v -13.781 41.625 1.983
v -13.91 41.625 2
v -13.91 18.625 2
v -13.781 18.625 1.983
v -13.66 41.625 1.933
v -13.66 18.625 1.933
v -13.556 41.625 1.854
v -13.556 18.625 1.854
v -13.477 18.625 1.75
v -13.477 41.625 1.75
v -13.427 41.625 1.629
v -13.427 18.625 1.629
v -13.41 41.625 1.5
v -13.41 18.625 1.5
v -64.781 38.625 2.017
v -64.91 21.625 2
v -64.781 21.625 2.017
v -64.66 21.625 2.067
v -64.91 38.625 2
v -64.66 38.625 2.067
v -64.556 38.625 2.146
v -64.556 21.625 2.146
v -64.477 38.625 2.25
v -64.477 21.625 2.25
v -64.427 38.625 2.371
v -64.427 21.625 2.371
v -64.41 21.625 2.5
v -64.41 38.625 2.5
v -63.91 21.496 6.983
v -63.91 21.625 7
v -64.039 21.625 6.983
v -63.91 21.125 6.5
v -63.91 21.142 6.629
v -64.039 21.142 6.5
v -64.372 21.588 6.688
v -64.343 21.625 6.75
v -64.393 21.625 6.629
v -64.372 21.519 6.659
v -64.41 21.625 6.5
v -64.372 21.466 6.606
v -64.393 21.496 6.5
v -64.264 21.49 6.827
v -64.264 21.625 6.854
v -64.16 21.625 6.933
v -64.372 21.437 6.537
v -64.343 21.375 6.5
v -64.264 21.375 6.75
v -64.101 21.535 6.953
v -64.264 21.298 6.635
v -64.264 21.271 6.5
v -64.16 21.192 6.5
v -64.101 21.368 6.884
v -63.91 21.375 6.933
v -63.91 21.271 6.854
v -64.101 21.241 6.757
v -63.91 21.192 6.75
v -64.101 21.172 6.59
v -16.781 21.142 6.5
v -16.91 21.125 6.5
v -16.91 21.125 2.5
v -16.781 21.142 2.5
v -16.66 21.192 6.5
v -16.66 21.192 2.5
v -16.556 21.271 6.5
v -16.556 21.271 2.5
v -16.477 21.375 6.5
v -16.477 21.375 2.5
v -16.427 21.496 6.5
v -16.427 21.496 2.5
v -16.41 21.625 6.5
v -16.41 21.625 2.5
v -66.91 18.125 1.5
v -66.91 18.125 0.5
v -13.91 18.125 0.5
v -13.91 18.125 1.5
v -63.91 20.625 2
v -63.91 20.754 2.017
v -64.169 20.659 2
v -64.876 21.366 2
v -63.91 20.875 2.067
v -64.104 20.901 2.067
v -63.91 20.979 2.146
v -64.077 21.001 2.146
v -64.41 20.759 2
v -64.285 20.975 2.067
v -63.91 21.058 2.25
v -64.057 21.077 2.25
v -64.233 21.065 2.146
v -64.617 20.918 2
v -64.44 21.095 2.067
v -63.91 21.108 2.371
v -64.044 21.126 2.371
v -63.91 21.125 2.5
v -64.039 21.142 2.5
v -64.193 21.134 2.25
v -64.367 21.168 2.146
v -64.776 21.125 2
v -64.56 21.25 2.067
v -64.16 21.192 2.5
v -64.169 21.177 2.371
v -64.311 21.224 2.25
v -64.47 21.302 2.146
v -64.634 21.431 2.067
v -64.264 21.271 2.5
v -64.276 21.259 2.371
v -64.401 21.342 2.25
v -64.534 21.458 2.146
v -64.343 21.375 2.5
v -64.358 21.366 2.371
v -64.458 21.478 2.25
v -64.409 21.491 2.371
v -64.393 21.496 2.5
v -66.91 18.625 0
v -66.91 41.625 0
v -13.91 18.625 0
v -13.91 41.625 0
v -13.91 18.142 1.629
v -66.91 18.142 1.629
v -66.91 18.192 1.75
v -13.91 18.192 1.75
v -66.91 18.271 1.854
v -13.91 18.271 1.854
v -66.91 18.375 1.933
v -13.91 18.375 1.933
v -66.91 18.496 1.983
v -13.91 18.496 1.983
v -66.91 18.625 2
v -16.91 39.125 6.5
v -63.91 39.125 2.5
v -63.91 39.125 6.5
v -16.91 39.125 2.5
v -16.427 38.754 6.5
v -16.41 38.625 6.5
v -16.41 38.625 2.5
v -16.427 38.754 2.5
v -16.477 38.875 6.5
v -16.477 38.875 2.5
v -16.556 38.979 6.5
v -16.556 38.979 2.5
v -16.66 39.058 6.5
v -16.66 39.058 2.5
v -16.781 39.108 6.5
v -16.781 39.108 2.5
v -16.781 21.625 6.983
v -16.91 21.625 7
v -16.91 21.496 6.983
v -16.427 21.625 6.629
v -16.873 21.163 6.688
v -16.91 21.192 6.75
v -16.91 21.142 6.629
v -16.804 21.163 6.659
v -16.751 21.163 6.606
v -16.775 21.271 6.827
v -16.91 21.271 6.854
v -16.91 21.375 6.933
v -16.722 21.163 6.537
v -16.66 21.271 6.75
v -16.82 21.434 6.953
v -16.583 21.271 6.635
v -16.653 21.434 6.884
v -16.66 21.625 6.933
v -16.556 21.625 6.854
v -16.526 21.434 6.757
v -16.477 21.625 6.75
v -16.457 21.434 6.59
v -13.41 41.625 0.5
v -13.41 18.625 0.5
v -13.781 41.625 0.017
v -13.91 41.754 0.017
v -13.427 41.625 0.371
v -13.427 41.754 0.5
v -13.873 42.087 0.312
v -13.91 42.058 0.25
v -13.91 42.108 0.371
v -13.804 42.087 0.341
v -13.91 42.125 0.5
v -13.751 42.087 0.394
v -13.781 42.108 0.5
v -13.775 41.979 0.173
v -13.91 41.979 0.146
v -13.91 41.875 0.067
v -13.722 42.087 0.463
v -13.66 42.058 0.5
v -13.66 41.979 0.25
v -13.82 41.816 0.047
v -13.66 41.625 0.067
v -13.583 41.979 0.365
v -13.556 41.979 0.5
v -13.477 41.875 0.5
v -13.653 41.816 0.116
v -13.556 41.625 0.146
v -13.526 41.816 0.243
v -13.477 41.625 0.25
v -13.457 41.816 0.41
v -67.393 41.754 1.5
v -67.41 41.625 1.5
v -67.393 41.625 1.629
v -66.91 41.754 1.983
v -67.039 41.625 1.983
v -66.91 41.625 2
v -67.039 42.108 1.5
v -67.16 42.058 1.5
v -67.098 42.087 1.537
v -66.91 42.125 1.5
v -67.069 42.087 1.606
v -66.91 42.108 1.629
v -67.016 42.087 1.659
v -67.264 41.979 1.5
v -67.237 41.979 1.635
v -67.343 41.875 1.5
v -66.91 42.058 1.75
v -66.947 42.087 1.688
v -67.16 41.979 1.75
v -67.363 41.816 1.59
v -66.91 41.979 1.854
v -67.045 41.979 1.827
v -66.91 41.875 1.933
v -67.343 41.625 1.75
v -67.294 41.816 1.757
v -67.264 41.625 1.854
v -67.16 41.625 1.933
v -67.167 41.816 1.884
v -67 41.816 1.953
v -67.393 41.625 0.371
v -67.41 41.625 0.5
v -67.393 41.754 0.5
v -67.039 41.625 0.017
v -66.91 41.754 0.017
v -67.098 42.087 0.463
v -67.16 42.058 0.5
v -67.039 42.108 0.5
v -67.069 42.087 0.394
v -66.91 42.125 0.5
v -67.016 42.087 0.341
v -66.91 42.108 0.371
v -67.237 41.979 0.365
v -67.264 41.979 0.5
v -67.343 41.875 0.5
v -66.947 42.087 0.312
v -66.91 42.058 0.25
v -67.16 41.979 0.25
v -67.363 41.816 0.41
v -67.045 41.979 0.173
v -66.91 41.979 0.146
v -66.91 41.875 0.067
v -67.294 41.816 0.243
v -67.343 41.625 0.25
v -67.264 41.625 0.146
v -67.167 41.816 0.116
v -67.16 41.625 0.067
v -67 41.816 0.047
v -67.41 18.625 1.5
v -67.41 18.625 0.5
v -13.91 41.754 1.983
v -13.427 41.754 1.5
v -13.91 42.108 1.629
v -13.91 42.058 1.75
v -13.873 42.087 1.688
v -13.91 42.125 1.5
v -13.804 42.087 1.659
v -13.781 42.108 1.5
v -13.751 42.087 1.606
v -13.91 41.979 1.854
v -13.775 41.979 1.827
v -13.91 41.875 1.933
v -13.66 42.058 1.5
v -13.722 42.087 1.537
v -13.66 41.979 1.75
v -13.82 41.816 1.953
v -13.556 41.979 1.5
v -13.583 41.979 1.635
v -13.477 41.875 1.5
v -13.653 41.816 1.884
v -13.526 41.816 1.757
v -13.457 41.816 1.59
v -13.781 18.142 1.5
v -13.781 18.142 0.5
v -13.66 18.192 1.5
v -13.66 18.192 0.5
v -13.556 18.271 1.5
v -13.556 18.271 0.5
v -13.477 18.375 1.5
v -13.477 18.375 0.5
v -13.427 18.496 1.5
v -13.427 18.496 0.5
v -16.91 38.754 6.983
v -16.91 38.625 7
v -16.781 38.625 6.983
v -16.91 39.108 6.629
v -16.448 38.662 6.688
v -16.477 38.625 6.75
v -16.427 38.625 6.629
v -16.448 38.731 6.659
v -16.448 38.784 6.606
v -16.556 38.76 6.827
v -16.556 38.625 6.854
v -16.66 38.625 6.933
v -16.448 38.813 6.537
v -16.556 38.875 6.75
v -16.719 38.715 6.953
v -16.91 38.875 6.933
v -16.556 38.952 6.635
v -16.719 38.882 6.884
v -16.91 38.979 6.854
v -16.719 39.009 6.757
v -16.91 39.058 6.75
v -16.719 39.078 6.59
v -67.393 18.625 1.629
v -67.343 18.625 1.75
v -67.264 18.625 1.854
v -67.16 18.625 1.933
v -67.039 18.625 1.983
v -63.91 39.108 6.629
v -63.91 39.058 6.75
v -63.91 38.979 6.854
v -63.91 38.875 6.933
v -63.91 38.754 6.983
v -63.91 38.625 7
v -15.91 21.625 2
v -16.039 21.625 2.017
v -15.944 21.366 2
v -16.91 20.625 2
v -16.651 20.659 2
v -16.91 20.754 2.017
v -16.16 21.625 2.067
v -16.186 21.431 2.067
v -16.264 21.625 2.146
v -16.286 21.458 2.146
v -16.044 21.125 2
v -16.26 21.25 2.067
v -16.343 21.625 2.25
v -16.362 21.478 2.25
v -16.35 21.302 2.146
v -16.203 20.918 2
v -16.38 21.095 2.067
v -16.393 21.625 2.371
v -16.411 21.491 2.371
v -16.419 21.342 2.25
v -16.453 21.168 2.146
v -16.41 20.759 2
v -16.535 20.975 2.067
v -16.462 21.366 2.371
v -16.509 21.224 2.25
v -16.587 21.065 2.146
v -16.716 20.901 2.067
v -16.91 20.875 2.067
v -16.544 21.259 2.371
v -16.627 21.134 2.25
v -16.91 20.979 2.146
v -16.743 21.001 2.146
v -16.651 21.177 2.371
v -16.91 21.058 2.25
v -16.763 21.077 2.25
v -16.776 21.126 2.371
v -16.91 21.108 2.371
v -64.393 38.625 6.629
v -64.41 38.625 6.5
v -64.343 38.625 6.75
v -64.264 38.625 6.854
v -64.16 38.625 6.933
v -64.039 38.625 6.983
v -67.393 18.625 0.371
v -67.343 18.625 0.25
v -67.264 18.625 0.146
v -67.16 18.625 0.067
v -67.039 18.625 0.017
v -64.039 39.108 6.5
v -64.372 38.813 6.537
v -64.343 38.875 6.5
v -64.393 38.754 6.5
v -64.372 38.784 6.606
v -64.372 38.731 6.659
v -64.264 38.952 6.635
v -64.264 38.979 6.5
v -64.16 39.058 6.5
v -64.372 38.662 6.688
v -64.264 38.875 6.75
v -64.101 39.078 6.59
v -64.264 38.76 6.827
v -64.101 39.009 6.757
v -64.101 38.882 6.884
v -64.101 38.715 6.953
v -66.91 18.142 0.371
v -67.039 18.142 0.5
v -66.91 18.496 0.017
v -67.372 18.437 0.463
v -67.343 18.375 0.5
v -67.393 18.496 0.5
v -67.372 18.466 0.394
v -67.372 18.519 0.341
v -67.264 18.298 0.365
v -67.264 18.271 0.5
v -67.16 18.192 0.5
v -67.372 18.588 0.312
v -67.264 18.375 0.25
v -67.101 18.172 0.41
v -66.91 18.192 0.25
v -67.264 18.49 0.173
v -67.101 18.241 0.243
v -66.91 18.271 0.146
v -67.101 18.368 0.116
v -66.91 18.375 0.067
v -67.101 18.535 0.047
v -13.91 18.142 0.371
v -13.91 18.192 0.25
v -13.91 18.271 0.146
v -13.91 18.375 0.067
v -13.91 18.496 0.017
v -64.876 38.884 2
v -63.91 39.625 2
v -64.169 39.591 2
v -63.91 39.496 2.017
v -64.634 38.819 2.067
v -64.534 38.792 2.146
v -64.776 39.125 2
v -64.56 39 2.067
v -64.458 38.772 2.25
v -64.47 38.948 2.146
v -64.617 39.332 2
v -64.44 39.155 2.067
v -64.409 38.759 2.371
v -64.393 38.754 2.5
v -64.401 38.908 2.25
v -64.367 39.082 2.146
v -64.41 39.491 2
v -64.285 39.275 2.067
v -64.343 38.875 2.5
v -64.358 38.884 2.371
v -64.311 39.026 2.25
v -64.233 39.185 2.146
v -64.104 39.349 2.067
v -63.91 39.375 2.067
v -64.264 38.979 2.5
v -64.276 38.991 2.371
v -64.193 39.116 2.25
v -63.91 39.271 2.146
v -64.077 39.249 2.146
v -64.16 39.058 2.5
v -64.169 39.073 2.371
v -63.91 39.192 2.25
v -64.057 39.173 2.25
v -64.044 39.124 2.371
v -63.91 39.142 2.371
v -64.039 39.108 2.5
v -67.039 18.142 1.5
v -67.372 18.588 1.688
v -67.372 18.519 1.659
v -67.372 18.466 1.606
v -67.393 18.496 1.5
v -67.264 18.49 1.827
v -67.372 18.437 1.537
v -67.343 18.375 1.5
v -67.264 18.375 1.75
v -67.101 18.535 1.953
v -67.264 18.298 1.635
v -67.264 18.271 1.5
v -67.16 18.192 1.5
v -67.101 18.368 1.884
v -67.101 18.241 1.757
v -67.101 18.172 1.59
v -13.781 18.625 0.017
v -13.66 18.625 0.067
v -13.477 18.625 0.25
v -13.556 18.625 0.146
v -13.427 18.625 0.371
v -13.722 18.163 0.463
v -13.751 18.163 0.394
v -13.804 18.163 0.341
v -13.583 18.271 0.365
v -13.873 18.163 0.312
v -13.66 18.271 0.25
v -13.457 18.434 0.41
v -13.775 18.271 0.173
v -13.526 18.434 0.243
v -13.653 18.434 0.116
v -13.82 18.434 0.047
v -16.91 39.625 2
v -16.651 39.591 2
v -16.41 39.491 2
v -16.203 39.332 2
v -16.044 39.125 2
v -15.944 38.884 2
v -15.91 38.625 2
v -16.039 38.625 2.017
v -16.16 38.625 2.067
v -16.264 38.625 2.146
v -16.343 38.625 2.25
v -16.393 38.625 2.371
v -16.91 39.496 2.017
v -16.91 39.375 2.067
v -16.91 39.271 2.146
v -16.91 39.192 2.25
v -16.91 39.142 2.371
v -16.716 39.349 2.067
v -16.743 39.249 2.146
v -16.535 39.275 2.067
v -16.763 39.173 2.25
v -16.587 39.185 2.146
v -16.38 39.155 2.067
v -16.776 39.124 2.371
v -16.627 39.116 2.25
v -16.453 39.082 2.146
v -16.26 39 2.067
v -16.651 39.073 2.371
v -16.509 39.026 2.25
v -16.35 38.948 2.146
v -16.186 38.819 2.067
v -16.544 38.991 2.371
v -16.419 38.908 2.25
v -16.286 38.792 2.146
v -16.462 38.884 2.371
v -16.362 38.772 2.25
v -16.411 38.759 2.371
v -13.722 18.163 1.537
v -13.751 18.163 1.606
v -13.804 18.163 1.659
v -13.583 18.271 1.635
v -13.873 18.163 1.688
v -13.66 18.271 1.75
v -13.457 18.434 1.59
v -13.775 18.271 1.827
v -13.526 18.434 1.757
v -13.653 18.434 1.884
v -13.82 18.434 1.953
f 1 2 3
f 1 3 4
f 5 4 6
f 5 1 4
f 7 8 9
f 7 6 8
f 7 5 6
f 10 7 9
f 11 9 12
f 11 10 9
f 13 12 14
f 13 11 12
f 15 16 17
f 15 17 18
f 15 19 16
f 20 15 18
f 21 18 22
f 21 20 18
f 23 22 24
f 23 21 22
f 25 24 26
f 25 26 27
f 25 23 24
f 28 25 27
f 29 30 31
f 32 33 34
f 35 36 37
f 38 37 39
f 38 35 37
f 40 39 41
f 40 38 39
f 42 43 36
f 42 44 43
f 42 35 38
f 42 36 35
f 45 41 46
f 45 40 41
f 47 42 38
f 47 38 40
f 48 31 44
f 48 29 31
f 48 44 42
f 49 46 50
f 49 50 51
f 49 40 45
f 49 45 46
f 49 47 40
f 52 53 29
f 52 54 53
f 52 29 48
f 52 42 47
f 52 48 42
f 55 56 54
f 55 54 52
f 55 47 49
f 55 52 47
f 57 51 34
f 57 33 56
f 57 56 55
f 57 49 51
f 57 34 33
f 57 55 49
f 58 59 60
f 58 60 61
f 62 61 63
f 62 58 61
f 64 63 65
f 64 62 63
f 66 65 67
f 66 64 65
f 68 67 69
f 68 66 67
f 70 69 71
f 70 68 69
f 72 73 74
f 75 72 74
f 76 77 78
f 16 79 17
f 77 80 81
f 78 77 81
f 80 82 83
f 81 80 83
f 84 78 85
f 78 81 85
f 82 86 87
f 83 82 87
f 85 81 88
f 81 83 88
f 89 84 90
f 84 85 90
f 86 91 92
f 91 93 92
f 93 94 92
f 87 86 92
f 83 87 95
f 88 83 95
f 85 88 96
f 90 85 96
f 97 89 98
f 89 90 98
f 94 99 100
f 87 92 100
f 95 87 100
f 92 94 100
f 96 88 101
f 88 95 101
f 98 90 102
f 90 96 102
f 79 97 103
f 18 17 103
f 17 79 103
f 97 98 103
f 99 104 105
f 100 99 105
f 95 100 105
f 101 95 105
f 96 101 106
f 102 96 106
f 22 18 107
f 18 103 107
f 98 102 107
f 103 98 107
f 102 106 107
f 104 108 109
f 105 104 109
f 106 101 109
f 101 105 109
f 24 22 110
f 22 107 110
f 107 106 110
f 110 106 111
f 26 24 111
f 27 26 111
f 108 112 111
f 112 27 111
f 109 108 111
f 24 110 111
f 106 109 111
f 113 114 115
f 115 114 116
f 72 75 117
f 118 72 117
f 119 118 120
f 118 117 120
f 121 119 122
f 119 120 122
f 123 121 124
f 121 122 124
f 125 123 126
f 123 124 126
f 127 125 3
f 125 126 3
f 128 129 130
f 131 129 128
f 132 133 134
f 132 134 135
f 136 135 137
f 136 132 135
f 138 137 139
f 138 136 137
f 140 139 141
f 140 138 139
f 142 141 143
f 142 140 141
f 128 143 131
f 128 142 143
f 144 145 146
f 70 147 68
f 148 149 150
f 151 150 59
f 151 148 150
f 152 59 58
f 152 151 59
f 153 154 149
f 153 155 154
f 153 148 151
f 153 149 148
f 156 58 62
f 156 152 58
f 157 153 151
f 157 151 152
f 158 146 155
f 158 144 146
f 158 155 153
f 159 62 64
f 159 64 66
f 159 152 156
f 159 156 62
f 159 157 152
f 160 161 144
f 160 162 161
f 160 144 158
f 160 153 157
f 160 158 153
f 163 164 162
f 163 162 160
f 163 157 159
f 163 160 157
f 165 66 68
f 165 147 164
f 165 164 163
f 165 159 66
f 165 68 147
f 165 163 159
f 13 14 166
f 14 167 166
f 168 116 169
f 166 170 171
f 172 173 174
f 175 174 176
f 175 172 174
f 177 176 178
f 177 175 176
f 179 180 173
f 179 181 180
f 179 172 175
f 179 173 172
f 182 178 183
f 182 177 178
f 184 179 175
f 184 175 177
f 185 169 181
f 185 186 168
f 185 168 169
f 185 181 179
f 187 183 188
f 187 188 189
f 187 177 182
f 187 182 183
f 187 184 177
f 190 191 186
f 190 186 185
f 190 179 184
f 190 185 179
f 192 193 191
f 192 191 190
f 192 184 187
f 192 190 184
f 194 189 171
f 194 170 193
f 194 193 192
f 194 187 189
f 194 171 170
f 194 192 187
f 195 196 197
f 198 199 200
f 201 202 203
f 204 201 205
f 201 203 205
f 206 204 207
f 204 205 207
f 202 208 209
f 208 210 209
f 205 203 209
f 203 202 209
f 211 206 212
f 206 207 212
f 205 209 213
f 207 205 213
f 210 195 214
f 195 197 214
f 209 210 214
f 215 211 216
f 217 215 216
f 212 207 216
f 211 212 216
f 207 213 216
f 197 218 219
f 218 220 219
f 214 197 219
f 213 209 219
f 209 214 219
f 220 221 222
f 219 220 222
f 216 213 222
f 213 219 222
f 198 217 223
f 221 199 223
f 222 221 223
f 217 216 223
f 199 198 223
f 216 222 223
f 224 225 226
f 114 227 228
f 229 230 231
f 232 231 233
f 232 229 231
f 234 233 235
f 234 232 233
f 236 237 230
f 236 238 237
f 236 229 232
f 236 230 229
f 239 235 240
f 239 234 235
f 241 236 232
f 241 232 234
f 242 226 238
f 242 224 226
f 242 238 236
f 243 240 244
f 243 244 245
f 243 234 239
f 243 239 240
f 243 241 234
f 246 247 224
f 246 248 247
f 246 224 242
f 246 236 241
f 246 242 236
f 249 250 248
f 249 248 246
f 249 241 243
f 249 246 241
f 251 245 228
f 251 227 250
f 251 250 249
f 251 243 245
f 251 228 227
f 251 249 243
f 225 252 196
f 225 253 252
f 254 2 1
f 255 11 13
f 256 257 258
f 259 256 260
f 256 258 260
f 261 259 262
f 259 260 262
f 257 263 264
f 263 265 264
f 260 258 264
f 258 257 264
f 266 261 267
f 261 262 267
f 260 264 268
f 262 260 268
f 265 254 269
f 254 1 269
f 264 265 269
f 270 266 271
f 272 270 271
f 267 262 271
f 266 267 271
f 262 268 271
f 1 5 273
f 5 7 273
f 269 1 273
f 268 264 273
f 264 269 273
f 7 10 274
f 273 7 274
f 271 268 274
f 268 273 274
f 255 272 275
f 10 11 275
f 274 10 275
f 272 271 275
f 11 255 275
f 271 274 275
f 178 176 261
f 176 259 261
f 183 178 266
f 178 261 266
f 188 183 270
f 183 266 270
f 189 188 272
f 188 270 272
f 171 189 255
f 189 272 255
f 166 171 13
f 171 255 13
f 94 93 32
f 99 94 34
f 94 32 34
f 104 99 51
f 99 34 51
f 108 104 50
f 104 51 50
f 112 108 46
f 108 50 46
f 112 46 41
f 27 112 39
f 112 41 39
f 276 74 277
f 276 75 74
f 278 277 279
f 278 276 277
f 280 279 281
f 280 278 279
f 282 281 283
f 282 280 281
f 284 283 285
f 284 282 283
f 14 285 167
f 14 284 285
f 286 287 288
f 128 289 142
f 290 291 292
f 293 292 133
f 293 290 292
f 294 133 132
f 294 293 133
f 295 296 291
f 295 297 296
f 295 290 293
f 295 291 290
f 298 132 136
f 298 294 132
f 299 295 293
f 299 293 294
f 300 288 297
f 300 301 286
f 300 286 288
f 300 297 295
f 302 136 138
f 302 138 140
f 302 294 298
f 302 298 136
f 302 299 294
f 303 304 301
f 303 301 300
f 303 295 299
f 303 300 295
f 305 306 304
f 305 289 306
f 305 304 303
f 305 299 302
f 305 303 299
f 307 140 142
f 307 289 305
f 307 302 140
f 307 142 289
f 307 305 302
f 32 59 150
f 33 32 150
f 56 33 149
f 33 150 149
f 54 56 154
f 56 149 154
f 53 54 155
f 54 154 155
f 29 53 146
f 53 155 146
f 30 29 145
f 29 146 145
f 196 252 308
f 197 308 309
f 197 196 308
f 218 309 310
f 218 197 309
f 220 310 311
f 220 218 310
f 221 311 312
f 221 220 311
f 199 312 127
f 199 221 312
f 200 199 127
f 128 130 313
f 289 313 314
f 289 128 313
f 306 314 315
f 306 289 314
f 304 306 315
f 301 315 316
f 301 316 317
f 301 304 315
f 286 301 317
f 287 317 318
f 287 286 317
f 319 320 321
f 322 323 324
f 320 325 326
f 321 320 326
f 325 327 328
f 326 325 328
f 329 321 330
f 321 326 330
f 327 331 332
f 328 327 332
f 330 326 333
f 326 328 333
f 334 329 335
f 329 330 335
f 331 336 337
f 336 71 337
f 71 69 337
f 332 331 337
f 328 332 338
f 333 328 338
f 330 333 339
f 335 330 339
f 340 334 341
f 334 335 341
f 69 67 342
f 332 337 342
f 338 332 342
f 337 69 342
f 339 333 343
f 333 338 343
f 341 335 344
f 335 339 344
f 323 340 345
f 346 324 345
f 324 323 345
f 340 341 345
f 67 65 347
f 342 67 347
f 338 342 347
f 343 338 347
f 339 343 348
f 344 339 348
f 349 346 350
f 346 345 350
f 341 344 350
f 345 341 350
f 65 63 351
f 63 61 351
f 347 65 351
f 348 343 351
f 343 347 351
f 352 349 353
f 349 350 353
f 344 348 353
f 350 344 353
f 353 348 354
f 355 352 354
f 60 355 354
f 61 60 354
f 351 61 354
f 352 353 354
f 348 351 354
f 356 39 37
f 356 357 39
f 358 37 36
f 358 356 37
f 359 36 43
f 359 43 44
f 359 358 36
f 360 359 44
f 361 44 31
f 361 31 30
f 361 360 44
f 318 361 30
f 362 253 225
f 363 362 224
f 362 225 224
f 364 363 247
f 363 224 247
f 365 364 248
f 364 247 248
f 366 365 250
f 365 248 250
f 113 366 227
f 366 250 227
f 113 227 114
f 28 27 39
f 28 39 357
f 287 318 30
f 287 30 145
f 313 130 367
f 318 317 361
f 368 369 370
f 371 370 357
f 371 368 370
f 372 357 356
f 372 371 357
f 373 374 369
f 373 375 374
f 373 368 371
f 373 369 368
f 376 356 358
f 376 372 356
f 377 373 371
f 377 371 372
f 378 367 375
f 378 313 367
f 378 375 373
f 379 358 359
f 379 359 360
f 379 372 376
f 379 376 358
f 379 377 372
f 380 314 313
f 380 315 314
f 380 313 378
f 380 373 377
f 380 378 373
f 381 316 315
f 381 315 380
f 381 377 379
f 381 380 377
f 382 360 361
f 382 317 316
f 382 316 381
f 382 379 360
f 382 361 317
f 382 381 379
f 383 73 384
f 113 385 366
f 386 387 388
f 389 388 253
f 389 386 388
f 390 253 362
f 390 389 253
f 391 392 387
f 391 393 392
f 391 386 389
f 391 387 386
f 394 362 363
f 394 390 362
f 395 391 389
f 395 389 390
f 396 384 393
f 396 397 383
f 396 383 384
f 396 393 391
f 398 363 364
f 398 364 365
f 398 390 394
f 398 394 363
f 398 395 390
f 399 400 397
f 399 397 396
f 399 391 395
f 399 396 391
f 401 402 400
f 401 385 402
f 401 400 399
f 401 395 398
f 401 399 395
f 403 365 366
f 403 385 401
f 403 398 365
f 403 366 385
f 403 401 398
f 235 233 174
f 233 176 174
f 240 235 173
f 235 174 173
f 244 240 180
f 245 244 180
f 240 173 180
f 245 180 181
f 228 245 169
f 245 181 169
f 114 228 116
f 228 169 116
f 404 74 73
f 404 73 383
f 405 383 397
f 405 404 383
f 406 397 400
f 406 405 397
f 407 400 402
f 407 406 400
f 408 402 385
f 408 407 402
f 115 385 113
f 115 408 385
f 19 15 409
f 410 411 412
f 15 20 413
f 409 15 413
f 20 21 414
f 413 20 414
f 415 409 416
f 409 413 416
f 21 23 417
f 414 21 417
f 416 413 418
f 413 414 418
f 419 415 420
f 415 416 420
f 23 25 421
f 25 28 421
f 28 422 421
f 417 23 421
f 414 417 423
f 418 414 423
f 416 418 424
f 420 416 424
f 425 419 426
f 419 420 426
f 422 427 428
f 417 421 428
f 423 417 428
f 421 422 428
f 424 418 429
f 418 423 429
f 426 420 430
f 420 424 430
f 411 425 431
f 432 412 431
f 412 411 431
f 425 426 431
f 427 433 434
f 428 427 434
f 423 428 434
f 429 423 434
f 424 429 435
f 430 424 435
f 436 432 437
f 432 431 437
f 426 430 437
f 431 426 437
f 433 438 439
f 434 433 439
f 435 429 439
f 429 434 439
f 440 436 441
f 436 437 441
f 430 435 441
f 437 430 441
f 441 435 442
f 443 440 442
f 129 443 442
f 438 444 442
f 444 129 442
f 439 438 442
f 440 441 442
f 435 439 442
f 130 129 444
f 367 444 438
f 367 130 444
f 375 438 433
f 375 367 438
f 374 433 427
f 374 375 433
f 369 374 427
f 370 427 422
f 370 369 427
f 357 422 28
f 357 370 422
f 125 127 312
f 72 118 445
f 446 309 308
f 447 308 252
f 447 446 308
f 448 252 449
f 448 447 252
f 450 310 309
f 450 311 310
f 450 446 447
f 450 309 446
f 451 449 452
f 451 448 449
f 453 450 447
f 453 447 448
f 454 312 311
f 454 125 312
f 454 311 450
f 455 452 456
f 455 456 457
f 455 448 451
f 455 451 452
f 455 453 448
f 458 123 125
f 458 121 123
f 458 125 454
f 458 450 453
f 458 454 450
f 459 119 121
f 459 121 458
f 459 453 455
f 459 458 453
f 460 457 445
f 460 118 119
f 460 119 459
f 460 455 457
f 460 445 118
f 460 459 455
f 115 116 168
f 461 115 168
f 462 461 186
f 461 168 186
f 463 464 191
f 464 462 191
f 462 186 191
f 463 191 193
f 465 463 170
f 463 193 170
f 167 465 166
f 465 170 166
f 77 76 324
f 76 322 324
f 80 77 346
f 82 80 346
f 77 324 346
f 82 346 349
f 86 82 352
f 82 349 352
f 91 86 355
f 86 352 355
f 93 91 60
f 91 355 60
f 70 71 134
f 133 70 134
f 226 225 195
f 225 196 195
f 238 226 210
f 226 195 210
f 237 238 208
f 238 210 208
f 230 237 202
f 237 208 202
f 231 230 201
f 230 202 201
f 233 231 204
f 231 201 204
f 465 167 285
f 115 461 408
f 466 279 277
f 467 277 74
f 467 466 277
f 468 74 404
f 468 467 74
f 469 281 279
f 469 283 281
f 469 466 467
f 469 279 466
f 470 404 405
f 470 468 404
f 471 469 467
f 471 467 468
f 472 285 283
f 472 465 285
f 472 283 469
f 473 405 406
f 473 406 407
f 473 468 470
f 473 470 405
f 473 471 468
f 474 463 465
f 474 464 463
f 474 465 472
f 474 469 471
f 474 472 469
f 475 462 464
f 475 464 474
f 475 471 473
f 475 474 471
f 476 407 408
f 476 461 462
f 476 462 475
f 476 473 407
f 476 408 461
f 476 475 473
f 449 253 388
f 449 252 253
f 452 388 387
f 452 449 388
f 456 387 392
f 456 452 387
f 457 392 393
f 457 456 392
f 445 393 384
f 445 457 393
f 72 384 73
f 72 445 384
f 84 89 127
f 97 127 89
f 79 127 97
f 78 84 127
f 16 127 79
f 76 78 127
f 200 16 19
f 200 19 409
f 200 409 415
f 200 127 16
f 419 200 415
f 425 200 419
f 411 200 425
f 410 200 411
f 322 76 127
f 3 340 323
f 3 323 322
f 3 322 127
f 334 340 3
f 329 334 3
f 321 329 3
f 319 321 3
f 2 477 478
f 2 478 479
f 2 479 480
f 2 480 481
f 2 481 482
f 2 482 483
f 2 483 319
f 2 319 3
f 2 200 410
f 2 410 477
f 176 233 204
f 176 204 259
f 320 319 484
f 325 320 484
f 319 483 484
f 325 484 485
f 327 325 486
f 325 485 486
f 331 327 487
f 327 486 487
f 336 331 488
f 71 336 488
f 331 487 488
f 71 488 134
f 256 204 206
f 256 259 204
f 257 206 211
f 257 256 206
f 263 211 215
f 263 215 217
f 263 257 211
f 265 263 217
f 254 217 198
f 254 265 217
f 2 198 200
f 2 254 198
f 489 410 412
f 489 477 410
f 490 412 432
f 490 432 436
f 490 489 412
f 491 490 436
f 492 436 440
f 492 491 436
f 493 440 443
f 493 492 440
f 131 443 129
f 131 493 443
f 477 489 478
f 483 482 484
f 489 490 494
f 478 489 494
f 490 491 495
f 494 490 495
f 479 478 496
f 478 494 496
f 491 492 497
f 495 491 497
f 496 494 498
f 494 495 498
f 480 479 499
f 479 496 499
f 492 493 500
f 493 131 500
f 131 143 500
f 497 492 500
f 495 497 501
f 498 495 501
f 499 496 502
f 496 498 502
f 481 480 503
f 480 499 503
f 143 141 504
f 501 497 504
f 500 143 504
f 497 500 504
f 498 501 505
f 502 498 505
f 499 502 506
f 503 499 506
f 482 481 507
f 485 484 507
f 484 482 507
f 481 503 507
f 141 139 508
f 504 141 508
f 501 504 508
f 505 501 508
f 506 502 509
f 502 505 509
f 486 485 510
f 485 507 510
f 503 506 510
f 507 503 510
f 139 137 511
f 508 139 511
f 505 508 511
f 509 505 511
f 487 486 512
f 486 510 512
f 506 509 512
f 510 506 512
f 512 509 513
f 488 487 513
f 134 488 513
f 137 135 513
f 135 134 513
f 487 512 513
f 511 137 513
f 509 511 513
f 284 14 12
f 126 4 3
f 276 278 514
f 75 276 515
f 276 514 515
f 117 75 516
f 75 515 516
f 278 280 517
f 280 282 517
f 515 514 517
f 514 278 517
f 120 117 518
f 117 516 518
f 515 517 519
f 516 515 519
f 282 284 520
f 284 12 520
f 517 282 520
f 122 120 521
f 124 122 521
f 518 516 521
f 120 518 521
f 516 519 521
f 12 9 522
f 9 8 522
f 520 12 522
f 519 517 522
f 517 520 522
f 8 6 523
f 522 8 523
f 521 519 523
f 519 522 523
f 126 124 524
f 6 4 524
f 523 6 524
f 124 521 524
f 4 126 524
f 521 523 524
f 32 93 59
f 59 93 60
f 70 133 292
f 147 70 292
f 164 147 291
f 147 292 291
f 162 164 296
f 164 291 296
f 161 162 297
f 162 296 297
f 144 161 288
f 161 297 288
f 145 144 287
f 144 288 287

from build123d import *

# Parameters (mm, degrees)
F0_W     = 54
F0_H     = 24
F1_DEPTH = 2
F2_W     = 48
F2_H     = 18
F3_DEPTH = 5
F4_R     = 0.5


with BuildPart() as f1:
    # F0 (on Top) → F1 (new body)
    with BuildSketch(Plane.XY):
        with Locations((-40.409996, 30.125001)):
            Rectangle(F0_W, F0_H)
    extrude(amount=F1_DEPTH)

    # F2 (on face) → F3 (join)
    with BuildSketch(Plane.XY.offset(2)):
        with Locations((-40.409996, 30.125001)):
            Rectangle(F2_W, F2_H)
    extrude(amount=F3_DEPTH)

    # F4
    f4_edges = [f1.edges().sort_by_distance(p)[0] for p in [
        (-40.409996, 39.125001, 2),
        (-40.409996, 39.125001, 7),
        (-64.409996, 39.125001, 4.5),
        (-16.409996, 30.125001, 2),
        (-16.409996, 30.125001, 7),
        (-40.409996, 21.125001, 7),
        (-40.409996, 21.125001, 2),
        (-64.409996, 30.125001, 7),
        (-64.409996, 30.125001, 2),
        (-64.409996, 21.125001, 4.5),
        (-16.409996, 21.125001, 4.5),
        (-16.409996, 39.125001, 4.5),
        (-13.409996, 30.125001, 2),
        (-13.409996, 30.125001, 0),
        (-13.409996, 18.125001, 1),
        (-40.409996, 18.125001, 0),
        (-40.409996, 18.125001, 2),
        (-67.409996, 30.125001, 2),
        (-67.409996, 18.125001, 1),
        (-67.409996, 30.125001, 0),
        (-67.409996, 42.125001, 1),
        (-40.409996, 42.125001, 2),
        (-40.409996, 42.125001, 0),
        (-13.409996, 42.125001, 1),
    ]]
    fillet(f4_edges, radius=F4_R)


solid = f1.part
